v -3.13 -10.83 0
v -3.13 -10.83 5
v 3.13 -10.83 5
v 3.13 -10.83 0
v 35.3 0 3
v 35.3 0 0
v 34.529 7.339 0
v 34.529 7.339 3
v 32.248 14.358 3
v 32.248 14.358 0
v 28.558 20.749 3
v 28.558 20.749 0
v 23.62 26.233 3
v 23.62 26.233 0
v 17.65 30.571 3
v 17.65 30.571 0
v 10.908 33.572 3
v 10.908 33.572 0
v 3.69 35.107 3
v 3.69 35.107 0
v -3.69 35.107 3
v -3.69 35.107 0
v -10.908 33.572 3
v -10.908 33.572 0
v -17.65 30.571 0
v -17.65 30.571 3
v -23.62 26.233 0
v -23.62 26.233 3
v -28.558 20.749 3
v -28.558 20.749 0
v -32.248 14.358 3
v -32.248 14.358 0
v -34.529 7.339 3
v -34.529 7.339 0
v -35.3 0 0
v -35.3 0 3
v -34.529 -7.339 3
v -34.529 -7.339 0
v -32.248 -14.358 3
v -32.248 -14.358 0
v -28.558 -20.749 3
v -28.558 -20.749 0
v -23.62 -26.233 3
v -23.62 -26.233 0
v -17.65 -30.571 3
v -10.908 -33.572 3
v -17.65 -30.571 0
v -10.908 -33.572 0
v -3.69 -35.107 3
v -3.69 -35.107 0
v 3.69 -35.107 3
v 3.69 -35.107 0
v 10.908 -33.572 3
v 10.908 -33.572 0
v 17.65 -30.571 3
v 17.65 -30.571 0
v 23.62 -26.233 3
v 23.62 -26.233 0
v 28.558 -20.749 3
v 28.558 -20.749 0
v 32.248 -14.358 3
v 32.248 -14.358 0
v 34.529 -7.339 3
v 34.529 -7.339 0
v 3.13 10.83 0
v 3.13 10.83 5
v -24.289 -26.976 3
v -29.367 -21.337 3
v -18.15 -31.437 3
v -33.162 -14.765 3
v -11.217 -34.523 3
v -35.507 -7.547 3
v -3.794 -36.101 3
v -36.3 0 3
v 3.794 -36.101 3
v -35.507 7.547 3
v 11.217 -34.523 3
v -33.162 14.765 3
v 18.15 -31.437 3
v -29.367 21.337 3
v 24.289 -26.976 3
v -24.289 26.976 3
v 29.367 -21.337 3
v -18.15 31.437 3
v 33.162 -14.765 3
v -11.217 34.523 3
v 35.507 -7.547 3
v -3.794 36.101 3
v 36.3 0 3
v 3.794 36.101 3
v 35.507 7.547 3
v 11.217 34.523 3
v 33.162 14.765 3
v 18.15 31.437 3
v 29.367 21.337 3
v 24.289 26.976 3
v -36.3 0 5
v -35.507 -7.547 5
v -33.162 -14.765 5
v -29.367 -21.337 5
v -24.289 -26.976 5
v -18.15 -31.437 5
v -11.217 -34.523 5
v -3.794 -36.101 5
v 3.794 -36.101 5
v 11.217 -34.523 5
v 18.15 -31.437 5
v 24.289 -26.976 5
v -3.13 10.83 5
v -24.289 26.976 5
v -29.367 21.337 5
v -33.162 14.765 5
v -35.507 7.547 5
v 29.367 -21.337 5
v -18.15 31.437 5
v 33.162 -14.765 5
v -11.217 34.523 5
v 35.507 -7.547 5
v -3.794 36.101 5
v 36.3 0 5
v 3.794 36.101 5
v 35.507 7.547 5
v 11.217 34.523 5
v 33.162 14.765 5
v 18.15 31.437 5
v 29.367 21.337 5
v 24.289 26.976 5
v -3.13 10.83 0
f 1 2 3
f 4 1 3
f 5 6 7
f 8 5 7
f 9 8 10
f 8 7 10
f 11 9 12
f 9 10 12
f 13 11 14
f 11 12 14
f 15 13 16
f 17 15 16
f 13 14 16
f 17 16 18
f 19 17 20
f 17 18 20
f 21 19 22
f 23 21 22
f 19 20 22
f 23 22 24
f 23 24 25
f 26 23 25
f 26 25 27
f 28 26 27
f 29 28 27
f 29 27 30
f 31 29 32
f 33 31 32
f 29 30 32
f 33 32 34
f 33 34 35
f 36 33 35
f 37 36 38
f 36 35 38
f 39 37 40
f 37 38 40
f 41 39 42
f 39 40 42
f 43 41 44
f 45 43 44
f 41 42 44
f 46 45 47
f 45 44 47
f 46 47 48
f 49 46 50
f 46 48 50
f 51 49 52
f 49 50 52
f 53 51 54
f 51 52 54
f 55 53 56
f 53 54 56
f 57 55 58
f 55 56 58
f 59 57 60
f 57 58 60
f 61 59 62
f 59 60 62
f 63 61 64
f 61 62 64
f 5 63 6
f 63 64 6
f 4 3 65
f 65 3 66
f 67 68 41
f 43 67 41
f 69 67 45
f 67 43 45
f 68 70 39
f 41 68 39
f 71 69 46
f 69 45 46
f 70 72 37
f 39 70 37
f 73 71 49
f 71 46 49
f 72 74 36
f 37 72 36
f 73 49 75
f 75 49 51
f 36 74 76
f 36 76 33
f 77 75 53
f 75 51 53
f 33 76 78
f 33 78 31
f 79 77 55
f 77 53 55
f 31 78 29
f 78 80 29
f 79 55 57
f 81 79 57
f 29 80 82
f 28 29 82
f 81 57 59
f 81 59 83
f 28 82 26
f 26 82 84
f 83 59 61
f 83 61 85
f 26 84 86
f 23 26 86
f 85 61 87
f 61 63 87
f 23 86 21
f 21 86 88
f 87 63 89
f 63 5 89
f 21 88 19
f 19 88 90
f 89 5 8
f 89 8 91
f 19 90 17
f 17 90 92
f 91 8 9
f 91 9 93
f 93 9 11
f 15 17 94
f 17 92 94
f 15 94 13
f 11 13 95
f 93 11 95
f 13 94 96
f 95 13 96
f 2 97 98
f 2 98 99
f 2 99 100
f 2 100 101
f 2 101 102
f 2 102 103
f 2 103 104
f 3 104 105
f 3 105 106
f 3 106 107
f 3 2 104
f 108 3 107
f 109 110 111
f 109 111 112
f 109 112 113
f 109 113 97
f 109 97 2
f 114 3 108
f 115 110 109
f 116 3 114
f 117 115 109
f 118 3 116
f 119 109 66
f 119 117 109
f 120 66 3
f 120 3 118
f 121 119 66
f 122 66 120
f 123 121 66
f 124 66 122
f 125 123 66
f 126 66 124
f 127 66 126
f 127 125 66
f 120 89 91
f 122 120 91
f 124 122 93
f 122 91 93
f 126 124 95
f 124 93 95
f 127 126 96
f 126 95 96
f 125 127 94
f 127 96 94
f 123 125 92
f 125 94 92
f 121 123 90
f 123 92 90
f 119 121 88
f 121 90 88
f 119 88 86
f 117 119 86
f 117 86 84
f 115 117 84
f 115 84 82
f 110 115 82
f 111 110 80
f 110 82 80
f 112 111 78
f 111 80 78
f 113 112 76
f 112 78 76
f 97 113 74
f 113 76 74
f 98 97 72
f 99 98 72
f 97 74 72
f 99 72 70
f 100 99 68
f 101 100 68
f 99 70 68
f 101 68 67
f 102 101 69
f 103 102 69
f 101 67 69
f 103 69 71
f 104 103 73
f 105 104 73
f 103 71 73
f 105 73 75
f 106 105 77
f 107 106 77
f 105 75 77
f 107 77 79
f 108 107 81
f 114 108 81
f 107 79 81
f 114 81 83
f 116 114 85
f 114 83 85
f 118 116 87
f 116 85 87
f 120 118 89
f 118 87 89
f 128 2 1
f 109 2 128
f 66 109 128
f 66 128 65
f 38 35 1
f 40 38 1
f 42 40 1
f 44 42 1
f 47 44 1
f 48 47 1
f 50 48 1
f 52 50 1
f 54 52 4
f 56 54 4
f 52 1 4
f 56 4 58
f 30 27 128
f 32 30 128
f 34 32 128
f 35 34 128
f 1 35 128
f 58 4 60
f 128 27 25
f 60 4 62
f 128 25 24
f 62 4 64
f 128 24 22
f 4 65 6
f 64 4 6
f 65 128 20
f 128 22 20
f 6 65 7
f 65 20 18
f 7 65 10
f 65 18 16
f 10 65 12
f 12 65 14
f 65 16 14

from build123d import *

# Parameters (mm, degrees)
F0_R     = 35.3
F1_DEPTH = 3
F3_R     = 36.3
F4_DEPTH = 2
F5_W     = 6.26
F5_H     = 21.66028
F6_DEPTH = 25


with BuildPart() as f1:
    # F0 (on Top) → F1 (new body)
    with BuildSketch(Plane.XY):
        Circle(F0_R)
    extrude(amount=F1_DEPTH)

    # F3 (on offset) → F4 (join)
    with BuildSketch(Plane.XY.offset(3)):
        Circle(F3_R)
    extrude(amount=F4_DEPTH)

    # F5 (on face) → F6 (cut)
    with BuildSketch(Plane.XY.offset(5)):
        with Locations((0, -0.00014)):
            Rectangle(F5_W, F5_H)
    extrude(amount=-F6_DEPTH, mode=Mode.SUBTRACT)


solid = f1.part
